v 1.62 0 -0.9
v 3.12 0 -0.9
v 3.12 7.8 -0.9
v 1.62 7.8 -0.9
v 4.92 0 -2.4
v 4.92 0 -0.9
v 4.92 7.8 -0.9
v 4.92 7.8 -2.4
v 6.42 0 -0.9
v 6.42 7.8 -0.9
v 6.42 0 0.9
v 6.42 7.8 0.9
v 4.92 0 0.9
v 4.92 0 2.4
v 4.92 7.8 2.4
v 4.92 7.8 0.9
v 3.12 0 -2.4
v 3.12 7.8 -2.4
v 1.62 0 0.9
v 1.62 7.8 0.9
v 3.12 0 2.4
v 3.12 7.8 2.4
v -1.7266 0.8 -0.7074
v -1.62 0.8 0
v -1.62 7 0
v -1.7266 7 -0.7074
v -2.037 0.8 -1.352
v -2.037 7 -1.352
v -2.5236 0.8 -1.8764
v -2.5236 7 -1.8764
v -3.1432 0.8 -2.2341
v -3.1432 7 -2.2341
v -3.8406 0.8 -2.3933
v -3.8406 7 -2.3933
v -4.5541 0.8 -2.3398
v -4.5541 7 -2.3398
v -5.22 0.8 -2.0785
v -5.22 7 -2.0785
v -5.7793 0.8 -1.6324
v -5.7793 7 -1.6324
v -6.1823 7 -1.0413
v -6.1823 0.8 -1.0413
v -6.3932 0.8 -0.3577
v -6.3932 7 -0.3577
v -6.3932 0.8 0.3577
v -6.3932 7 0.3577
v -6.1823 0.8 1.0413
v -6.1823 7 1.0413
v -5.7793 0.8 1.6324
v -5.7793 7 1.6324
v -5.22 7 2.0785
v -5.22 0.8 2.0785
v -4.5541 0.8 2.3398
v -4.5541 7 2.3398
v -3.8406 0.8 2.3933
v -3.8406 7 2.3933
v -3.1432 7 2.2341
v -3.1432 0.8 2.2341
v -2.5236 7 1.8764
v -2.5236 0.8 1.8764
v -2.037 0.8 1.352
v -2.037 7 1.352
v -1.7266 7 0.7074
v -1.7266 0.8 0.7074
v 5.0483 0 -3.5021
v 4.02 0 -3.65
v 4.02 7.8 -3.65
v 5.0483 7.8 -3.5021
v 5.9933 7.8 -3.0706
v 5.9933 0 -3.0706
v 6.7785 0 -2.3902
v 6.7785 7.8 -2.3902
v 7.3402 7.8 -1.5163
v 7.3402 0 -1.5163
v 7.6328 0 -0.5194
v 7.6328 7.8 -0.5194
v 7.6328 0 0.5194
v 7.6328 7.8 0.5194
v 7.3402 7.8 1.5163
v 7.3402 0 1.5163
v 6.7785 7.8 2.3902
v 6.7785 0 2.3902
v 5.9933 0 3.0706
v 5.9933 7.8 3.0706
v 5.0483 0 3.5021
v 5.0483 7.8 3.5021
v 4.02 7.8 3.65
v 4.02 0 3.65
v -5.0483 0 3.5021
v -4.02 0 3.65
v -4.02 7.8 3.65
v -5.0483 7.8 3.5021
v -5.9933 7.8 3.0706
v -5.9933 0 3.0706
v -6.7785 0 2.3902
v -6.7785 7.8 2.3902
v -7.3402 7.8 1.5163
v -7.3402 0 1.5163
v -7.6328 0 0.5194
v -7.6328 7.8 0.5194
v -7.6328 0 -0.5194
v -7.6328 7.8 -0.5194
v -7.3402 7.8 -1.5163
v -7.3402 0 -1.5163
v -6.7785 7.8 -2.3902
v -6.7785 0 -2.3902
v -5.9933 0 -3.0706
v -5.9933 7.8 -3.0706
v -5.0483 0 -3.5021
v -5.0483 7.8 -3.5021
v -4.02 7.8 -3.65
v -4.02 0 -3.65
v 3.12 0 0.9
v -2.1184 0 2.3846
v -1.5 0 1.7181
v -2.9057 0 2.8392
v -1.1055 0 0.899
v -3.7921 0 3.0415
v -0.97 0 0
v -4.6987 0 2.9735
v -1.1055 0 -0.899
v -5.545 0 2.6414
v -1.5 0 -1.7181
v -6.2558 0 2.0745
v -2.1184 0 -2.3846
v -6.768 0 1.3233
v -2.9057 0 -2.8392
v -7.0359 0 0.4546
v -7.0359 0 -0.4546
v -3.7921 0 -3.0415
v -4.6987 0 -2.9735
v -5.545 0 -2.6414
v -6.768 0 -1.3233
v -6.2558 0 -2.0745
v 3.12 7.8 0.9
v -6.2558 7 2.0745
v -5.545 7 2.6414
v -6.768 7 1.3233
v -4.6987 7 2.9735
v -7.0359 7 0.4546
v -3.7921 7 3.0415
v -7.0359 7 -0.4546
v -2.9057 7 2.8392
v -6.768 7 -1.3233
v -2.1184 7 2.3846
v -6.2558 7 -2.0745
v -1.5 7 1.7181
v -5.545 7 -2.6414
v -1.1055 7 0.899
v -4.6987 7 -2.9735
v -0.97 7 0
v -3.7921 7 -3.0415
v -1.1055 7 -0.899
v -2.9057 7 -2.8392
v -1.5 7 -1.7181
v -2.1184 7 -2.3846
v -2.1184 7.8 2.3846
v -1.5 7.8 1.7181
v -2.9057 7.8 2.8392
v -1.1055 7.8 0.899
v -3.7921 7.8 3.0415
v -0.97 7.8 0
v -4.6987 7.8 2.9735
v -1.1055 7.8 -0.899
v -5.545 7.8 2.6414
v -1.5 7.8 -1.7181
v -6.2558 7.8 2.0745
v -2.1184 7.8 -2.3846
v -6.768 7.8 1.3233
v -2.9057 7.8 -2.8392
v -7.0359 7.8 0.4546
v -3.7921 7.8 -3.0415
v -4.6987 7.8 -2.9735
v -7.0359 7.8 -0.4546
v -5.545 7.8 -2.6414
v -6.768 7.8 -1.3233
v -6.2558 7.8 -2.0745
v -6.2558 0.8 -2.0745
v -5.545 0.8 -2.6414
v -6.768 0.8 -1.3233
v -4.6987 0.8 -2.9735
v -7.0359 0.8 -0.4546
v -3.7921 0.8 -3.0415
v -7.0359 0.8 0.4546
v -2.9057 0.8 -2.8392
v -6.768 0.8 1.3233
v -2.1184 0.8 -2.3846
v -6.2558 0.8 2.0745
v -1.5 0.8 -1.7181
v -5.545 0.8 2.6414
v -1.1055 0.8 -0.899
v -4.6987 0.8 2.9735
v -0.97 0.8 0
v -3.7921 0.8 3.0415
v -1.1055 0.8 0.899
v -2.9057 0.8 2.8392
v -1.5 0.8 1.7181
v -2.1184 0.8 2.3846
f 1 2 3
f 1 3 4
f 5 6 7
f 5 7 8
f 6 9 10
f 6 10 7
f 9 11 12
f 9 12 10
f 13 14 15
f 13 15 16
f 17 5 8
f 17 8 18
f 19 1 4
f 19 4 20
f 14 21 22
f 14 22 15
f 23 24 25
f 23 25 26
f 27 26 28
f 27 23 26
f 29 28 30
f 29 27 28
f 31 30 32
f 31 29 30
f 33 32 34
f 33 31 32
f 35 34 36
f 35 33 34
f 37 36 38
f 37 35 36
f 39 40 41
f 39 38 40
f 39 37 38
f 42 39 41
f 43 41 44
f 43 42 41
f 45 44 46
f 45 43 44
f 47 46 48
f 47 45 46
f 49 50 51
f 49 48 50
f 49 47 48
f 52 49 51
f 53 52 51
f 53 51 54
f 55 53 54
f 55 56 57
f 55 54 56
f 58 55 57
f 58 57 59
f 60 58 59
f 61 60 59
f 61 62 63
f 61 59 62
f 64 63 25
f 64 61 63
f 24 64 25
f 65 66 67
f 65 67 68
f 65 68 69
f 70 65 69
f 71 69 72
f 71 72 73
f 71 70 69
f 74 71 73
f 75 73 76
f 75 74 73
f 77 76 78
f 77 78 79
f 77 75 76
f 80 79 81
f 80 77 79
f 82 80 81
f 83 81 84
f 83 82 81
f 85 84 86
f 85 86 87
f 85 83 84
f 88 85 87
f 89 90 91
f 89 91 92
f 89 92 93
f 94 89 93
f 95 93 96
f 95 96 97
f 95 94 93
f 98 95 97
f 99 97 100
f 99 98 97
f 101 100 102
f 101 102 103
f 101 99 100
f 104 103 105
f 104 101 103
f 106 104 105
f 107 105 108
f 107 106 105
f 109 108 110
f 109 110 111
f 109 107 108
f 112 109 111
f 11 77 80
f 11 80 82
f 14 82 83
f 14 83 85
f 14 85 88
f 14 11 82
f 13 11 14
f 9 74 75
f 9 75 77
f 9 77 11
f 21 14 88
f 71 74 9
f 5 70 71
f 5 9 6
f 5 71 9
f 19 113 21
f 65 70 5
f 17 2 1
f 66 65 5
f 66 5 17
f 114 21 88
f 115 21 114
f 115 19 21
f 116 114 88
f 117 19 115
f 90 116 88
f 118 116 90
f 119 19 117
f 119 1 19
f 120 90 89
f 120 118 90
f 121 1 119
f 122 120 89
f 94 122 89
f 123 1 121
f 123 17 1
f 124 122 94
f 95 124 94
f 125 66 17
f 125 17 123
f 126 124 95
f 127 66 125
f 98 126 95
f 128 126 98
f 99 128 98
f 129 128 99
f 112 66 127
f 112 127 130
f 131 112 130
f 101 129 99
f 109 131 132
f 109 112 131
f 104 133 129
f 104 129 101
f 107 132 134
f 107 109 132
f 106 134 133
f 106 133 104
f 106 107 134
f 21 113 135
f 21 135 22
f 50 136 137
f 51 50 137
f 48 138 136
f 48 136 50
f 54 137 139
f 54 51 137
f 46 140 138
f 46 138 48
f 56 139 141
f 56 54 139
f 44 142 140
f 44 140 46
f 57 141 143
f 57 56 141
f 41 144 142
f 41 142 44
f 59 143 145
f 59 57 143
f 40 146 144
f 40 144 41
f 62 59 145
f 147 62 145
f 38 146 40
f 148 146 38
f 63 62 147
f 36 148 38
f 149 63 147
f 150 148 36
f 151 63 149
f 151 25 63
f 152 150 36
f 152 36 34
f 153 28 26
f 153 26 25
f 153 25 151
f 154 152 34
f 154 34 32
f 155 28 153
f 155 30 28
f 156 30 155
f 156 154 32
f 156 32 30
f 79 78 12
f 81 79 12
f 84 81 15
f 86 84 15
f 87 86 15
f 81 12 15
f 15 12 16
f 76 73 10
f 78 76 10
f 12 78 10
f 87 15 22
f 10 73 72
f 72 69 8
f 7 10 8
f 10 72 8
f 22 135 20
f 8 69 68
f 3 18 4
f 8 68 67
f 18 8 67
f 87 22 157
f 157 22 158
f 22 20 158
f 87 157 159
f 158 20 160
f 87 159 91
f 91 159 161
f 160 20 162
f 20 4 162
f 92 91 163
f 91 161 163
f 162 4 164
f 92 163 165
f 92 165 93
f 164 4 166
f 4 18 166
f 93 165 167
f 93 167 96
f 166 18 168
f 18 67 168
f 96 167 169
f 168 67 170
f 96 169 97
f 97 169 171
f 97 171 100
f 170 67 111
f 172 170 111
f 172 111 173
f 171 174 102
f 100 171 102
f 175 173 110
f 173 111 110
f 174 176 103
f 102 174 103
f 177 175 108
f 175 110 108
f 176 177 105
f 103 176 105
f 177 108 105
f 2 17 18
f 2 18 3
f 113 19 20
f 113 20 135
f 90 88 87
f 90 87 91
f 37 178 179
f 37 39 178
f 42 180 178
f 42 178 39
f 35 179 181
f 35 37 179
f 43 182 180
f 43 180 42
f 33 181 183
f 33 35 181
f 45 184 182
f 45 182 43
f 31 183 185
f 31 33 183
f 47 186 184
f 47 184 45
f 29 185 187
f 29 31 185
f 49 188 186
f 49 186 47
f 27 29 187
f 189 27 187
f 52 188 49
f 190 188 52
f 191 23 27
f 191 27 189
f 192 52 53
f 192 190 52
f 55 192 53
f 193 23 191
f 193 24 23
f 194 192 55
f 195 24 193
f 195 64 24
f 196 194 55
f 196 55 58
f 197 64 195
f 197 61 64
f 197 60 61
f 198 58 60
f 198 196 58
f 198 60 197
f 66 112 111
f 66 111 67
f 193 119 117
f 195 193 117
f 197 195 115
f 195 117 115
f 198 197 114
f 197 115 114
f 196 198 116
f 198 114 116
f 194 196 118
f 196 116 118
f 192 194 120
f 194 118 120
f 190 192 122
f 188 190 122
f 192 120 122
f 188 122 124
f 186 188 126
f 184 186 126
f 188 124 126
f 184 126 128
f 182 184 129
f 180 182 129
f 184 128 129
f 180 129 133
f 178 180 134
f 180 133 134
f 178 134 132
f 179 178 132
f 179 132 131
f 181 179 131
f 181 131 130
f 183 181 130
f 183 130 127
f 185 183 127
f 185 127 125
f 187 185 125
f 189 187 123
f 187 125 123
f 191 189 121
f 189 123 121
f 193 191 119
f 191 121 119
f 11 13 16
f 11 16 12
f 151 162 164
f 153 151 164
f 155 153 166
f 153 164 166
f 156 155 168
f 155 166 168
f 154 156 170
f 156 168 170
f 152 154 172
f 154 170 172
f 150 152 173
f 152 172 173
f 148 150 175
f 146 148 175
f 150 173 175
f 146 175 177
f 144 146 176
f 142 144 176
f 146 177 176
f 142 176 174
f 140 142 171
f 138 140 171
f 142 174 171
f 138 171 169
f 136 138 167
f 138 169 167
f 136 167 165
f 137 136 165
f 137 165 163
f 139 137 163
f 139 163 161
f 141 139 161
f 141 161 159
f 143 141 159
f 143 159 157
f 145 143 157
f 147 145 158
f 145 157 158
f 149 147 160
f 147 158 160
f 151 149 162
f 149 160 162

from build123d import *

# Parameters (mm, degrees)
SKETCH1_R           = 2.4
BOSS_EXTRUDE1_DEPTH = 7.8
SKETCH2_R           = 3.05
CUT_EXTRUDE1_DEPTH  = 0.8
SKETCH4_R           = 3.05
CUT_EXTRUDE2_DEPTH  = 0.8


with BuildPart() as part:
    # Sketch1 → Boss-Extrude1 (new body)
    with BuildSketch(Plane(origin=(0, 0, 0), x_dir=(1, 0, 0), z_dir=(0, 1, 0))):
        with BuildLine():
            Line((-4.02, 3.65), (4.02, 3.65))
            ThreePointArc((4.02, 3.65), (7.67, 0), (4.02, -3.65))
            Line((4.02, -3.65), (-4.02, -3.65))
            ThreePointArc((-4.02, -3.65), (-7.67, 0), (-4.02, 3.65))
        make_face()
        with Locations((-4.02, 0)):
            Circle(SKETCH1_R, mode=Mode.SUBTRACT)
        Polygon((3.12, 2.4), (3.12, 0.9), (1.62, 0.9), (1.62, -0.9), (3.12, -0.9), (3.12, -2.4), (4.92, -2.4), (4.92, -0.9), (6.42, -0.9), (6.42, 0.9), (4.92, 0.9), (4.92, 2.4), align=None, mode=Mode.SUBTRACT)
    extrude(amount=BOSS_EXTRUDE1_DEPTH)

    # Sketch2 → Cut-Extrude1 (cut)
    with BuildSketch(Plane(origin=(0, 7.8, 0), x_dir=(1, 0, 0), z_dir=(0, 1, 0))):
        with Locations((-4.02, 0)):
            Circle(SKETCH2_R)
    extrude(amount=-CUT_EXTRUDE1_DEPTH, mode=Mode.SUBTRACT)

    # Sketch4 → Cut-Extrude2 (cut)
    with BuildSketch(Plane.XZ):
        with Locations((-4.02, 0)):
            Circle(SKETCH4_R)
    extrude(amount=-CUT_EXTRUDE2_DEPTH, mode=Mode.SUBTRACT)


solid = part.part
